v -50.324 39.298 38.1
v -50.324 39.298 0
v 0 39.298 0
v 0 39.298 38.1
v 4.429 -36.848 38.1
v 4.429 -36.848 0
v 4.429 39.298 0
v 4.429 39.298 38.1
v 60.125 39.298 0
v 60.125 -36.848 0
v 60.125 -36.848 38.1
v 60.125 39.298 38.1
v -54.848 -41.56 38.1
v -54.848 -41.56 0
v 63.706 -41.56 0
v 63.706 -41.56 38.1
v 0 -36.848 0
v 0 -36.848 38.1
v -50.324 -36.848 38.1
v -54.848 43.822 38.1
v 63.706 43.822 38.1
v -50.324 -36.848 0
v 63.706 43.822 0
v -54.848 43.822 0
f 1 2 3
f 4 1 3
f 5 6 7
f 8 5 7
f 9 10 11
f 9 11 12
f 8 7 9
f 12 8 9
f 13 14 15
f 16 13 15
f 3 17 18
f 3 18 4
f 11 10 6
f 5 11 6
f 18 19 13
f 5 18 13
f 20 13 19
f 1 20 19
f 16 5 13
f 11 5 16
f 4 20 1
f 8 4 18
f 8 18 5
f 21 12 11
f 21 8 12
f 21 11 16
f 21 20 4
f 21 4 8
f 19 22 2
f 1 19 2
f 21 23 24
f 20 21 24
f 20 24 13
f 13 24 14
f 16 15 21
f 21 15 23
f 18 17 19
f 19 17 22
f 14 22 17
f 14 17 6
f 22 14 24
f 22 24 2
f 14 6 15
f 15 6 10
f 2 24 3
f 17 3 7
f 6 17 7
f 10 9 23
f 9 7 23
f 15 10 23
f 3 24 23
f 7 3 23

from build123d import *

# Parameters (mm, degrees)
F0_W     = 3.581136
F0_H     = 76.146152
F0_W_2   = 4.429294
F1_DEPTH = 38.1


with BuildPart() as f1:
    # F0 (on Top) → F1 (new body)
    with BuildSketch(Plane.XY):
        Polygon((-50.32431, 39.298199), (-54.847848, 39.298199), (-54.847848, -41.559964), (-50.32431, -41.559964), (-50.32431, -36.847953), align=None)
        with Locations((61.915867, 1.225123)):
            Rectangle(F0_W, F0_H)
        Polygon((63.706435, -41.559964), (63.706435, -36.847953), (60.125299, -36.847953), (4.429294, -36.847953), (0, -36.847953), (-50.32431, -36.847953), (-50.32431, -41.559964), align=None)
        with Locations((2.214647, 1.225123)):
            Rectangle(F0_W_2, F0_H)
        Polygon((63.706435, 43.821733), (-54.847848, 43.821733), (-54.847848, 39.298199), (-50.32431, 39.298199), (0, 39.298199), (4.429294, 39.298199), (60.125299, 39.298199), (63.706435, 39.298199), align=None)
    extrude(amount=F1_DEPTH)


solid = f1.part
